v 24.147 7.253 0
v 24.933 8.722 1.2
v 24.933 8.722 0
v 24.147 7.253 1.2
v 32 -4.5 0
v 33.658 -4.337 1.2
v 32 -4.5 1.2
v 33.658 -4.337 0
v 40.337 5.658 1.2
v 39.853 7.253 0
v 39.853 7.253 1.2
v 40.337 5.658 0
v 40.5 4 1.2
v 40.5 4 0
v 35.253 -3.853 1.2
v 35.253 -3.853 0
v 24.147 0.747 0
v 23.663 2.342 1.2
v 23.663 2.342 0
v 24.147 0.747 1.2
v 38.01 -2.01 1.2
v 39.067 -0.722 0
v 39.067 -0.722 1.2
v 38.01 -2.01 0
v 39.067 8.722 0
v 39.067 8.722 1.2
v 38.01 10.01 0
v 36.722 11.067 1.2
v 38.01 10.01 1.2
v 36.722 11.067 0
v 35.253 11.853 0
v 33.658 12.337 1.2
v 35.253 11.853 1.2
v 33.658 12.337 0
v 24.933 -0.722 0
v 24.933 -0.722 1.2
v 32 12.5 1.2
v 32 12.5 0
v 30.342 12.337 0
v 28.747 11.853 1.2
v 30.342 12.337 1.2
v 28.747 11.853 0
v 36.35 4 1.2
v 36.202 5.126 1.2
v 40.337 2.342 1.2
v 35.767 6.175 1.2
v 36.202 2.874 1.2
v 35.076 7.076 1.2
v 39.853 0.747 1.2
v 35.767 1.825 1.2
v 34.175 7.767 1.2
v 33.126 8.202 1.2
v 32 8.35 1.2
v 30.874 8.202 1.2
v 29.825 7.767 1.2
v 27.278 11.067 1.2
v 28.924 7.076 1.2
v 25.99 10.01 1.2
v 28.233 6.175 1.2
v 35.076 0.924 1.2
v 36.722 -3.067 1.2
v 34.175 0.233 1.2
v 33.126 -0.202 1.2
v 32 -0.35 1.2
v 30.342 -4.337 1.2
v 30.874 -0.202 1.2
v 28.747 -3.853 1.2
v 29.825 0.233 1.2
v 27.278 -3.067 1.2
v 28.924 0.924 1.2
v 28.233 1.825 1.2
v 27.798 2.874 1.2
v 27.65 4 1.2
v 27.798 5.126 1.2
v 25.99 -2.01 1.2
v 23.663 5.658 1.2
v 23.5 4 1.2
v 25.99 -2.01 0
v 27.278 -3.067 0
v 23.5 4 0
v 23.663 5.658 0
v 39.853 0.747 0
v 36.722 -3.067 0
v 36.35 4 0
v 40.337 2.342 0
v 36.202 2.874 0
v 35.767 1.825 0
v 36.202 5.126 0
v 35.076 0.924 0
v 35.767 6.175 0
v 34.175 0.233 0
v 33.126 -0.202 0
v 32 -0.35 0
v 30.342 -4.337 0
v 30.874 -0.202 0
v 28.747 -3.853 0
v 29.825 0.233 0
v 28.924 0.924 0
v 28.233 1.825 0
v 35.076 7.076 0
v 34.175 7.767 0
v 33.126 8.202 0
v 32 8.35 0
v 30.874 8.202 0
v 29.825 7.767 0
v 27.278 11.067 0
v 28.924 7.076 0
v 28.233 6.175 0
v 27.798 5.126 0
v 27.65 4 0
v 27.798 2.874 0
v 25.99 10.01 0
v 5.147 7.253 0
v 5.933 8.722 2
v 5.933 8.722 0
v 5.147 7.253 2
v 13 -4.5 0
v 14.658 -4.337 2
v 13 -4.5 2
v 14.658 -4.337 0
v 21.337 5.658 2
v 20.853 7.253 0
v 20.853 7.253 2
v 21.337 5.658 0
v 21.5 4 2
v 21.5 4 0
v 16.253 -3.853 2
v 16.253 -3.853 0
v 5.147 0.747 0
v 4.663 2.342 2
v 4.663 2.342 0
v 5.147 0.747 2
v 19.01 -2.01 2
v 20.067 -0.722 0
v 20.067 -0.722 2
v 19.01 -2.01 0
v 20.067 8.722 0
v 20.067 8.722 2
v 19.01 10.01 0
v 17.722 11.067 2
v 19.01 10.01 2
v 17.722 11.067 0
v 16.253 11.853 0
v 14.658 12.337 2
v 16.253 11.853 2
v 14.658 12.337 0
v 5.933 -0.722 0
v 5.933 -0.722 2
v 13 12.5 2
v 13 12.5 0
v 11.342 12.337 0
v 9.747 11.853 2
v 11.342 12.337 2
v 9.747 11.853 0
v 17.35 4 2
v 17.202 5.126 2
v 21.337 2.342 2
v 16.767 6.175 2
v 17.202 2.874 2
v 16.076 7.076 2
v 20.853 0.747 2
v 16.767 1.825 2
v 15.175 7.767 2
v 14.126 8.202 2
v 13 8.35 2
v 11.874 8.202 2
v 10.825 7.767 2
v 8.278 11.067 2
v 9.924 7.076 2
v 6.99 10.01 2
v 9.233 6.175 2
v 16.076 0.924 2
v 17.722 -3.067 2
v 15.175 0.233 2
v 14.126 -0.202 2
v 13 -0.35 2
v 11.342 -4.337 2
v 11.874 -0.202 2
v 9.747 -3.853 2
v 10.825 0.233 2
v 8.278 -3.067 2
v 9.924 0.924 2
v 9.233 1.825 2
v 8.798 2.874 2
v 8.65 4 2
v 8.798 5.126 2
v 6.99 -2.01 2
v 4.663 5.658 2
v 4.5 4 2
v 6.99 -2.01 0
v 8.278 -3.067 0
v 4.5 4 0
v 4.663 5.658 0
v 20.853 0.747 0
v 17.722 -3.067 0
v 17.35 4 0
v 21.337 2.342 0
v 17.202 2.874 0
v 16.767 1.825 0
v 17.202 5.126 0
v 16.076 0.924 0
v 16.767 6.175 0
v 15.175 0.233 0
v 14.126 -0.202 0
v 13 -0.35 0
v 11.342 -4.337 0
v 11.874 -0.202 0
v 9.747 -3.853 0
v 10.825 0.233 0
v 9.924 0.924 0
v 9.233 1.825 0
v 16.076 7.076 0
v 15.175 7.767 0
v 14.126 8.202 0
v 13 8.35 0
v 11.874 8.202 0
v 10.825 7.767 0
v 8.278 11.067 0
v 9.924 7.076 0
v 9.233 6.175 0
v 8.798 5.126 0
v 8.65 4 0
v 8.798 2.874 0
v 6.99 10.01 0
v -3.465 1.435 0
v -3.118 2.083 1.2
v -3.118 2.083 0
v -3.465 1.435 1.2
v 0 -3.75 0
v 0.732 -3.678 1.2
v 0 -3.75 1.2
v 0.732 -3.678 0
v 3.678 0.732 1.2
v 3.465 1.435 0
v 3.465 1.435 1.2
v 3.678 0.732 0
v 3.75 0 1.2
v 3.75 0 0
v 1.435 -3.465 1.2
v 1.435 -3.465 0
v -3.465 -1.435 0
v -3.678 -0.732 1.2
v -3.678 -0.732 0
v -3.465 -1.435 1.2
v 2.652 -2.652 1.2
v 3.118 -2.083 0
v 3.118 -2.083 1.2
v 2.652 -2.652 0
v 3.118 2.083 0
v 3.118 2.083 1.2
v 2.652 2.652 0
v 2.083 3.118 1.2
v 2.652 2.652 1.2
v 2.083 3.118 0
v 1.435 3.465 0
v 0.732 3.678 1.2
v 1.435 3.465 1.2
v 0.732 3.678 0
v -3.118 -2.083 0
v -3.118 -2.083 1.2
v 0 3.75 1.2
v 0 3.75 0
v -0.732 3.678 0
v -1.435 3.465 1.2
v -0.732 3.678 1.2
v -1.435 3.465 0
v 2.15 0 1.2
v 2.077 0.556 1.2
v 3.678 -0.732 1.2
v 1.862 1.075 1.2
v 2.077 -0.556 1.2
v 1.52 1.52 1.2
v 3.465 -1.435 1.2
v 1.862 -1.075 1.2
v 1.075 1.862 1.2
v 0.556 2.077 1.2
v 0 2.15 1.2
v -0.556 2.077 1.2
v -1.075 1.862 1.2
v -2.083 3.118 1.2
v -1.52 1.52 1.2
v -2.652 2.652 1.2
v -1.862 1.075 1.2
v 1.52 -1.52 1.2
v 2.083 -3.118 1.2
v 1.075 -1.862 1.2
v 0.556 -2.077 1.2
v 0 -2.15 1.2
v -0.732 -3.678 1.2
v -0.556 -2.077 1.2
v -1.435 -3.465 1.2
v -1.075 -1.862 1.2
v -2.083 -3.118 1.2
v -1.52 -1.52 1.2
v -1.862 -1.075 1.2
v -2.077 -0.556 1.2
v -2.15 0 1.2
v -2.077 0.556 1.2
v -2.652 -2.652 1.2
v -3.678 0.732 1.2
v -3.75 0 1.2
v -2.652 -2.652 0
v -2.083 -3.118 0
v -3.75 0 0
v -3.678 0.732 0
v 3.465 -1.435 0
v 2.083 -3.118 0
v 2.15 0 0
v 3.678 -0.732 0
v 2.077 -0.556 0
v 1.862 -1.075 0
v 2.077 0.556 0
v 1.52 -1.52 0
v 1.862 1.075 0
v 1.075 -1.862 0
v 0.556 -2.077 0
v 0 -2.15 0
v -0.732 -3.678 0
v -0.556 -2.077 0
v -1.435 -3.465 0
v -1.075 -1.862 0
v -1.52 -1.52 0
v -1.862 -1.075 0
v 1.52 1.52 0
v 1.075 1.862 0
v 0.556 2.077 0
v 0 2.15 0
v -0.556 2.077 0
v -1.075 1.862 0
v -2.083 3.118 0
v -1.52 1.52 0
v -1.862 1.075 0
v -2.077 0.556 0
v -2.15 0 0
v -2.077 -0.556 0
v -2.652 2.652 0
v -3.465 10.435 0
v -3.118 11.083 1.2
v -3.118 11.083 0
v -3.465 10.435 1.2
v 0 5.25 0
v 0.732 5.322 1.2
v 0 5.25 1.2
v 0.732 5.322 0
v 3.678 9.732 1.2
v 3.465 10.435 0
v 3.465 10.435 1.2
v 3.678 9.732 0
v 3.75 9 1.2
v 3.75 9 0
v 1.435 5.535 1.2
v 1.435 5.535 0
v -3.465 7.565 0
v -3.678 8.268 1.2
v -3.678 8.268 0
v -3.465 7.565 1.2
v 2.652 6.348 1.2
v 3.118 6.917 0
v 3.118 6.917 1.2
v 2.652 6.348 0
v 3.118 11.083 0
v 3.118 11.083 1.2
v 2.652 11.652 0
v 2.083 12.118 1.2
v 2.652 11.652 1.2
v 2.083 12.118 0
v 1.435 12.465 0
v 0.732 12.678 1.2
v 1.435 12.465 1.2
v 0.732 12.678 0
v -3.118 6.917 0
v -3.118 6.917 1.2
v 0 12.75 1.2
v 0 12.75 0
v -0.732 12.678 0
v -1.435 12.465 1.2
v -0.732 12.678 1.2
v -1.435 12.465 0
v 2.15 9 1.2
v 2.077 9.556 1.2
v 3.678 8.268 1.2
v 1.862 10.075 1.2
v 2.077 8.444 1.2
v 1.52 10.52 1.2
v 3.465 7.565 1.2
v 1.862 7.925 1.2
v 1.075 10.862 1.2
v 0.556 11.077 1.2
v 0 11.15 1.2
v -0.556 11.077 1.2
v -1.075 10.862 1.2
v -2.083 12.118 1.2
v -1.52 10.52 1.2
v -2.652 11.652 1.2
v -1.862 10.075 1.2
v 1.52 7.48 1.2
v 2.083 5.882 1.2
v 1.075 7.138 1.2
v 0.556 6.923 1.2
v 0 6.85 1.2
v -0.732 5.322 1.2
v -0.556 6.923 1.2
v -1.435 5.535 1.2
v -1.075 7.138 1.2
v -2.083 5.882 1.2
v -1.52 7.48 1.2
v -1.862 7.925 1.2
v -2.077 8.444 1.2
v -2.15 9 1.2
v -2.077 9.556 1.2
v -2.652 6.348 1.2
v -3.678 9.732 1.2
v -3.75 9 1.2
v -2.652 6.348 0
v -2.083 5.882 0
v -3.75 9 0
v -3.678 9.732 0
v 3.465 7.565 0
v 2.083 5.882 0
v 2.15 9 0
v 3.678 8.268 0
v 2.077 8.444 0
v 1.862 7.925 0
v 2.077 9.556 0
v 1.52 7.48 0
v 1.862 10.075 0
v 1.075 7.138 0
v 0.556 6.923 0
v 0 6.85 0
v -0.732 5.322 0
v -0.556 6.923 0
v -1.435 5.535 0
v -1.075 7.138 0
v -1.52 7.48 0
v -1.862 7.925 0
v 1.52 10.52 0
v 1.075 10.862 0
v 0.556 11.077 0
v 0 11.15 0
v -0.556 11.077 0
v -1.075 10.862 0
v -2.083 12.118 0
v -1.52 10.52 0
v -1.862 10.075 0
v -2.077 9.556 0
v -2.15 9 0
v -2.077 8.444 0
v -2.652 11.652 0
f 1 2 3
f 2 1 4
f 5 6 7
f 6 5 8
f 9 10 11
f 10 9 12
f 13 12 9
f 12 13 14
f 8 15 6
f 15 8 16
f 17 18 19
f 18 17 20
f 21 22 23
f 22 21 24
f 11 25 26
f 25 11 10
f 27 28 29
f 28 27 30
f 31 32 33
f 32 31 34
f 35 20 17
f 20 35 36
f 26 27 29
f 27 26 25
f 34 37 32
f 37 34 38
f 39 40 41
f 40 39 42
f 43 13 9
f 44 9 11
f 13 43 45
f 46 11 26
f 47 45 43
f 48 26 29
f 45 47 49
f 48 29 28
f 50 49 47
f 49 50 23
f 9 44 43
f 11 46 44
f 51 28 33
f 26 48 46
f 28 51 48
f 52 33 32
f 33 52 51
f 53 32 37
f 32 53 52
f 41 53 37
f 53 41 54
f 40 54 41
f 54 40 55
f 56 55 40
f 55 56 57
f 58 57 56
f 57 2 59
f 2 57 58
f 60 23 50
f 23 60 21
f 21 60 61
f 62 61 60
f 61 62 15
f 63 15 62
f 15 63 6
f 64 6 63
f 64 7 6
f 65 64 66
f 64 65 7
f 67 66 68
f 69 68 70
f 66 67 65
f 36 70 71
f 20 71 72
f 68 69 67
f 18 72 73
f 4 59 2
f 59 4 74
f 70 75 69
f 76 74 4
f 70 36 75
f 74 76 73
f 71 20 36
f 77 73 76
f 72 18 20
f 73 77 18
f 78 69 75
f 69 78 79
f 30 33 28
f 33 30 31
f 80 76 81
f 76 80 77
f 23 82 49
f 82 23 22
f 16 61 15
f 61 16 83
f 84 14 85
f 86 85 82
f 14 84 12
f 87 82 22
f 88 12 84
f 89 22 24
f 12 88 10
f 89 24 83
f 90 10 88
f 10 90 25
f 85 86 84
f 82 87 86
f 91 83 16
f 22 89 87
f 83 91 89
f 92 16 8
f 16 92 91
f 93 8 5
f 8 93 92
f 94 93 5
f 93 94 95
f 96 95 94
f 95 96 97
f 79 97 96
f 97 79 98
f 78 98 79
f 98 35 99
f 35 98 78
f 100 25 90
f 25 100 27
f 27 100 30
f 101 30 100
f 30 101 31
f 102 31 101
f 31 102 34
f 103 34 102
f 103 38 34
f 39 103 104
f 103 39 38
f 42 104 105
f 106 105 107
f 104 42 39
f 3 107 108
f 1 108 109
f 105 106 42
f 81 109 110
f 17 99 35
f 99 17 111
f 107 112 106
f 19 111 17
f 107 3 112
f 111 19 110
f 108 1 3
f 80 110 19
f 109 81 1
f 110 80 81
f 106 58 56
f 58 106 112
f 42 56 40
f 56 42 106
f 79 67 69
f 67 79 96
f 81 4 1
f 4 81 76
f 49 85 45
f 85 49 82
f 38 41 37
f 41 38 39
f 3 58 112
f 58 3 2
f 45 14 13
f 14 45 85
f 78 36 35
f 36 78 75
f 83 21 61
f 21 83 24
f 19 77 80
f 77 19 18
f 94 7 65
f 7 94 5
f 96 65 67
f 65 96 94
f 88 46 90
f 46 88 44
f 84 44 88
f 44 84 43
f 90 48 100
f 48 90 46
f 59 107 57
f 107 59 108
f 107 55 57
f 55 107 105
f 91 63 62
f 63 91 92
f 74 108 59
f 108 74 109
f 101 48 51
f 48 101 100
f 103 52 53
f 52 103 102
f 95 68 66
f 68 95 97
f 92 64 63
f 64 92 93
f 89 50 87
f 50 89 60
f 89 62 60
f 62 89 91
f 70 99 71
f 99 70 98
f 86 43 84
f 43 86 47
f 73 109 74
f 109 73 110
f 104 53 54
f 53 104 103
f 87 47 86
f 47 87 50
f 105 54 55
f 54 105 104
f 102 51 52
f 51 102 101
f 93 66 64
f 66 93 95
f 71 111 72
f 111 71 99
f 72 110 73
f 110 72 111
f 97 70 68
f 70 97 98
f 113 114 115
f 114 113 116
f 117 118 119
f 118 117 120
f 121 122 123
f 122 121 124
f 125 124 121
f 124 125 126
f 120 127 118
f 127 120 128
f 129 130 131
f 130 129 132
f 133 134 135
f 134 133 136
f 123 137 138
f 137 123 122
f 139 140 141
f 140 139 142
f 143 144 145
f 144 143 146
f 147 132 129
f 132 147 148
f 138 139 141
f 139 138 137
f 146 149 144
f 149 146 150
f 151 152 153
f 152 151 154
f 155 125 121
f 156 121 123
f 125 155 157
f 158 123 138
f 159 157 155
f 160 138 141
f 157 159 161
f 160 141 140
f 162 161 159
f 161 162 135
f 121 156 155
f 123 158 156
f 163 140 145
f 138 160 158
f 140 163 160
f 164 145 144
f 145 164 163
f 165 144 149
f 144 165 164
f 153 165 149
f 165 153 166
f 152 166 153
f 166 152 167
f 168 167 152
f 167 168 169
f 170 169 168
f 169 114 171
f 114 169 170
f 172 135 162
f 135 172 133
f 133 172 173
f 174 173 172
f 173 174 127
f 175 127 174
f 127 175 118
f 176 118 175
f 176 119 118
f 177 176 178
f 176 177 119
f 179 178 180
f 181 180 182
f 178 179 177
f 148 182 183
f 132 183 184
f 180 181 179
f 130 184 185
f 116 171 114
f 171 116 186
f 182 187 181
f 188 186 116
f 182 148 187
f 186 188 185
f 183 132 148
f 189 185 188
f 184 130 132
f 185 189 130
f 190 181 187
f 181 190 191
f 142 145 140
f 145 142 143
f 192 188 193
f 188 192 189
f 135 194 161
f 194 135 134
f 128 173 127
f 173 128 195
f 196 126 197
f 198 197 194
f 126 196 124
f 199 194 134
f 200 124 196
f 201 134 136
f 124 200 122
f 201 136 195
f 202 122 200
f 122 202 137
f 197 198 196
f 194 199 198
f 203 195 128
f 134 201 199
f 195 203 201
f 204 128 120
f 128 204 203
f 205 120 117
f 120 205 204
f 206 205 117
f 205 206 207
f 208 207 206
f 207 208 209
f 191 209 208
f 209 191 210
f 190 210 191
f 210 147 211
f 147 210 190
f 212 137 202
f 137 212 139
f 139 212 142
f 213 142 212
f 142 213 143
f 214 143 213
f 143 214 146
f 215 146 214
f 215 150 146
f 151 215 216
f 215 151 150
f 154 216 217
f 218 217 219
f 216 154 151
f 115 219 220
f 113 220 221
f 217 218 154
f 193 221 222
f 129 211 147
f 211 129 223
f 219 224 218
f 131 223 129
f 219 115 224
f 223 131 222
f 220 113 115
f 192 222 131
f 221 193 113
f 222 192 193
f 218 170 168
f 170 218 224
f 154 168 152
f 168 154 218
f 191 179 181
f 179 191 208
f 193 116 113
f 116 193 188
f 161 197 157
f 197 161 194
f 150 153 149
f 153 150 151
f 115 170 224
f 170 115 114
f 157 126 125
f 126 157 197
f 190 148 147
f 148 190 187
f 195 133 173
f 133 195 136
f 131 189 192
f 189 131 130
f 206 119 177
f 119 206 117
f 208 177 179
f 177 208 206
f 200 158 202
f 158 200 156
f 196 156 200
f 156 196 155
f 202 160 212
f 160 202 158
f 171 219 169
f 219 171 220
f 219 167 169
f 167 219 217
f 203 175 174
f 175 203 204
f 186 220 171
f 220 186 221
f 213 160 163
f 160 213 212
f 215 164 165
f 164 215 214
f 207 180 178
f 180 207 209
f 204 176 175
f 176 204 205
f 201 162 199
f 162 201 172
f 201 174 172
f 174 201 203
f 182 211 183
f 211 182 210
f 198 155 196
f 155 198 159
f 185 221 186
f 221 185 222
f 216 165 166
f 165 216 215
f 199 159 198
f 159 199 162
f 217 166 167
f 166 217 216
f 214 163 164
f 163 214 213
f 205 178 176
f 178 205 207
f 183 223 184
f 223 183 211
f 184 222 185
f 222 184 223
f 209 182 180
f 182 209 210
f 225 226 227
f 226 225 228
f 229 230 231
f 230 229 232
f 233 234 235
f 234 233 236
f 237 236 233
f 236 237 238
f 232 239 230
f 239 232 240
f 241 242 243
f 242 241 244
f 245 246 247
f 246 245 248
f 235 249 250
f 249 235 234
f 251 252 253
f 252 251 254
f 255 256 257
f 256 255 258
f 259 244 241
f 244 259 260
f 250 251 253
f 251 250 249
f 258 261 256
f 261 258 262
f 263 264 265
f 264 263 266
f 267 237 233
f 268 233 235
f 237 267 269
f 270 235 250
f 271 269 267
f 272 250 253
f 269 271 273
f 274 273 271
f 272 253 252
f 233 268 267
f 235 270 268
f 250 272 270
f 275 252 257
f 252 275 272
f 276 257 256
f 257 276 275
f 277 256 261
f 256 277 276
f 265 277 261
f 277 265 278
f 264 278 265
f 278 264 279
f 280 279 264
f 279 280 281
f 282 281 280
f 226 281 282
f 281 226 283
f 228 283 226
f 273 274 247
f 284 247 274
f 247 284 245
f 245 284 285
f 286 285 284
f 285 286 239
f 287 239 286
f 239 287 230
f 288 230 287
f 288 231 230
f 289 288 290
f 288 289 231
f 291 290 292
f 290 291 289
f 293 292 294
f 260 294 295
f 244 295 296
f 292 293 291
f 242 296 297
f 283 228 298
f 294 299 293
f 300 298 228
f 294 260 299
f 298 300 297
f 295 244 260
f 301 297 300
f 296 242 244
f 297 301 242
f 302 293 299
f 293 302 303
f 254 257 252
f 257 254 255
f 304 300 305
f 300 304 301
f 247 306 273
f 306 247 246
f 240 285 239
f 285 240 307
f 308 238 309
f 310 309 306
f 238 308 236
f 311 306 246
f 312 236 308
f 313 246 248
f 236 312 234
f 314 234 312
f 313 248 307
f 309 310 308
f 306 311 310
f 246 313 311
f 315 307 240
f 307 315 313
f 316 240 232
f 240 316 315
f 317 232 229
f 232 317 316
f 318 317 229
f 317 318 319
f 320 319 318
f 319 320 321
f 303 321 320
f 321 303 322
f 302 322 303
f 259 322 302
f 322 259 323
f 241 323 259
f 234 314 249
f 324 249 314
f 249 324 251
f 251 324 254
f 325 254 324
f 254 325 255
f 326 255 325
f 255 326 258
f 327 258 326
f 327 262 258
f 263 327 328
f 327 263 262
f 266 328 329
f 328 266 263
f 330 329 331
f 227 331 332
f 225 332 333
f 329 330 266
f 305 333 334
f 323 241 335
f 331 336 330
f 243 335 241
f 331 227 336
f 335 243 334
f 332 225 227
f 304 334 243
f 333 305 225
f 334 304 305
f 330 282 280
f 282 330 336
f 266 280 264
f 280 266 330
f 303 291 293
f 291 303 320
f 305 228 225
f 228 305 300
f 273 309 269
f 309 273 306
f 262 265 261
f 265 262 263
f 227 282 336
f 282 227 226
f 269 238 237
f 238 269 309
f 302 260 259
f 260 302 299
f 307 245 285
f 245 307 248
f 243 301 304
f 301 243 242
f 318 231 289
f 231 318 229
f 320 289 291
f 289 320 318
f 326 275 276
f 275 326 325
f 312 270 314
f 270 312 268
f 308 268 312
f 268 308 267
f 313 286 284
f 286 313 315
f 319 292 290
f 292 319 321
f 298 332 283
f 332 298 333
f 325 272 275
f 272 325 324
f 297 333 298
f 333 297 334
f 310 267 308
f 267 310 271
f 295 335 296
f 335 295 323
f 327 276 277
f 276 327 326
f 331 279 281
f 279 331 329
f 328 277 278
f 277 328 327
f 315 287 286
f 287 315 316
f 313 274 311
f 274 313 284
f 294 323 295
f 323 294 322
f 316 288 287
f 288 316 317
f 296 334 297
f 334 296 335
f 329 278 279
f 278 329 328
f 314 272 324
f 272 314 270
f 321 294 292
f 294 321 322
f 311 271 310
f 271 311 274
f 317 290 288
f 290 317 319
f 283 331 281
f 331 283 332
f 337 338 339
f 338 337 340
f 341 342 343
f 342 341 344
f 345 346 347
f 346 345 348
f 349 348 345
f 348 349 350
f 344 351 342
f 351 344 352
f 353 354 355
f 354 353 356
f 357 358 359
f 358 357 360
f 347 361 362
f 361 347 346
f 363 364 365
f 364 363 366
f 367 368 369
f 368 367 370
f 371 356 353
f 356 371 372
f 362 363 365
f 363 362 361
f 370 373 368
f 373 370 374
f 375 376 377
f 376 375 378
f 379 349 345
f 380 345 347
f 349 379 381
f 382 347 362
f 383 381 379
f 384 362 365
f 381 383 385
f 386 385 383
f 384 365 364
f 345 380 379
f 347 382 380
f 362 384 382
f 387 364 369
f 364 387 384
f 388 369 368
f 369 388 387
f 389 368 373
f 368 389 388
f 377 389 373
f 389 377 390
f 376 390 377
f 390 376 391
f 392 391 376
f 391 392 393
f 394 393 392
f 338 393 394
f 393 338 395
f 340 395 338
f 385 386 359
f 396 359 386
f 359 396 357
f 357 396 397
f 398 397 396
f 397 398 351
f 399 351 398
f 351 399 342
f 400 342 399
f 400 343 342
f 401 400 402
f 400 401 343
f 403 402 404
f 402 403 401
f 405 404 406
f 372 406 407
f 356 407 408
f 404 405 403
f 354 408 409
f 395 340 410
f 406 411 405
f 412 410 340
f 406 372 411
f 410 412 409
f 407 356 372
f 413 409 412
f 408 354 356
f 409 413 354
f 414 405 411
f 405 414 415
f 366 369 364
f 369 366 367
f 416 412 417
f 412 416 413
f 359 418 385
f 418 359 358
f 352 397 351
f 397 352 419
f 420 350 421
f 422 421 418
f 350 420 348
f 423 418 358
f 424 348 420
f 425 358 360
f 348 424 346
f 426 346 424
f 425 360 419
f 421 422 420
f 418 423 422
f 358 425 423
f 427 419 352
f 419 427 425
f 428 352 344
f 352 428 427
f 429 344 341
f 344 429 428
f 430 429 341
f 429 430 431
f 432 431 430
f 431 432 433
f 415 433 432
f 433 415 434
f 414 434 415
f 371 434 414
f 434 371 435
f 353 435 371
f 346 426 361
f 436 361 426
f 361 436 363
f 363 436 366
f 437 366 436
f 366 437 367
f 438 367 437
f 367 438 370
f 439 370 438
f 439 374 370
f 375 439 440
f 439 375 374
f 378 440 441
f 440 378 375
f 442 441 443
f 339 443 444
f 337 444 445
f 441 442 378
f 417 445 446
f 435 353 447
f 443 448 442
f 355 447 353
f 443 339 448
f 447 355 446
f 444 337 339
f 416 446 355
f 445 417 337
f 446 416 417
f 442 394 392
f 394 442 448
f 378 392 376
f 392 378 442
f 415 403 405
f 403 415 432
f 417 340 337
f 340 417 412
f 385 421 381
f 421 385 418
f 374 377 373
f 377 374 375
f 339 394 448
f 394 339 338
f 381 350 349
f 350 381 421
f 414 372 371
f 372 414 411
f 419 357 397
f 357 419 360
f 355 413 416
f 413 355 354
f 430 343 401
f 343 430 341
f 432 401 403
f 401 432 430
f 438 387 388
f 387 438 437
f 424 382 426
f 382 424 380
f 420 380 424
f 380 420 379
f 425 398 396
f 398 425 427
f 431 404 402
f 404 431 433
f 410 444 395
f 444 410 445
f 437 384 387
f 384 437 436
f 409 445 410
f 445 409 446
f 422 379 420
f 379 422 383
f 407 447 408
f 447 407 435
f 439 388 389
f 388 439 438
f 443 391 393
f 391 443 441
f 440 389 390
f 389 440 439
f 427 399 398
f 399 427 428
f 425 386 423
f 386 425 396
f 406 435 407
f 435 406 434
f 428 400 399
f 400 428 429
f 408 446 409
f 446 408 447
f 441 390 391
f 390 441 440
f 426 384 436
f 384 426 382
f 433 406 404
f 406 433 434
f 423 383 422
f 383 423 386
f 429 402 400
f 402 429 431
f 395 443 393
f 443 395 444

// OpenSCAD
//
// Washers for the extruder
//
// Licensed under the GNU GPL license.
//  2013 by AlainMouette
//

// it doesn't make sense to me to go out shopping for washers,
//   so I printed them,

// The 2mm M8 washer it fo inserting between the big gear and the extruder body
// I use an extra thin washer between the bearing and the fixing nuts
// A few 0.5mm washers are handy for adjusting tractor position

// I use some cheap springs for the idler but the ends are
//   not very smooth, a washer is needed but comercial ones
//   create a problem with the fast-release lever
//   so... I made two smaller washers for that



////////// RENDER TRACTOR WASHER ///////////////////////////////////////////////////
// Positioning for multiple parts
translate([32,4,0]) M8_washer(width=1.2);
translate([13,4,0]) M8_washer(width=2);

translate([0,0,0]) IdlerScrew_washer();
translate([0,9,0]) IdlerScrew_washer();


// Default is the same as comercial metal washers
module M8_washer(width=1.2){
	difference(){
		cylinder(r=17/2,h=width,$fn=32);
		translate([0,0,-1])
		cylinder(r=8.7/2,h=10,$fn=24);
	}
}

// smaller washer for the Idler Screw,
module IdlerScrew_washer(width=1.2){
	difference(){
		cylinder(r=7.5/2,h=width,$fn=32);
		translate([0,0,-1])
		cylinder(r=4.3/2,h=10,$fn=24);
	}
}
 
